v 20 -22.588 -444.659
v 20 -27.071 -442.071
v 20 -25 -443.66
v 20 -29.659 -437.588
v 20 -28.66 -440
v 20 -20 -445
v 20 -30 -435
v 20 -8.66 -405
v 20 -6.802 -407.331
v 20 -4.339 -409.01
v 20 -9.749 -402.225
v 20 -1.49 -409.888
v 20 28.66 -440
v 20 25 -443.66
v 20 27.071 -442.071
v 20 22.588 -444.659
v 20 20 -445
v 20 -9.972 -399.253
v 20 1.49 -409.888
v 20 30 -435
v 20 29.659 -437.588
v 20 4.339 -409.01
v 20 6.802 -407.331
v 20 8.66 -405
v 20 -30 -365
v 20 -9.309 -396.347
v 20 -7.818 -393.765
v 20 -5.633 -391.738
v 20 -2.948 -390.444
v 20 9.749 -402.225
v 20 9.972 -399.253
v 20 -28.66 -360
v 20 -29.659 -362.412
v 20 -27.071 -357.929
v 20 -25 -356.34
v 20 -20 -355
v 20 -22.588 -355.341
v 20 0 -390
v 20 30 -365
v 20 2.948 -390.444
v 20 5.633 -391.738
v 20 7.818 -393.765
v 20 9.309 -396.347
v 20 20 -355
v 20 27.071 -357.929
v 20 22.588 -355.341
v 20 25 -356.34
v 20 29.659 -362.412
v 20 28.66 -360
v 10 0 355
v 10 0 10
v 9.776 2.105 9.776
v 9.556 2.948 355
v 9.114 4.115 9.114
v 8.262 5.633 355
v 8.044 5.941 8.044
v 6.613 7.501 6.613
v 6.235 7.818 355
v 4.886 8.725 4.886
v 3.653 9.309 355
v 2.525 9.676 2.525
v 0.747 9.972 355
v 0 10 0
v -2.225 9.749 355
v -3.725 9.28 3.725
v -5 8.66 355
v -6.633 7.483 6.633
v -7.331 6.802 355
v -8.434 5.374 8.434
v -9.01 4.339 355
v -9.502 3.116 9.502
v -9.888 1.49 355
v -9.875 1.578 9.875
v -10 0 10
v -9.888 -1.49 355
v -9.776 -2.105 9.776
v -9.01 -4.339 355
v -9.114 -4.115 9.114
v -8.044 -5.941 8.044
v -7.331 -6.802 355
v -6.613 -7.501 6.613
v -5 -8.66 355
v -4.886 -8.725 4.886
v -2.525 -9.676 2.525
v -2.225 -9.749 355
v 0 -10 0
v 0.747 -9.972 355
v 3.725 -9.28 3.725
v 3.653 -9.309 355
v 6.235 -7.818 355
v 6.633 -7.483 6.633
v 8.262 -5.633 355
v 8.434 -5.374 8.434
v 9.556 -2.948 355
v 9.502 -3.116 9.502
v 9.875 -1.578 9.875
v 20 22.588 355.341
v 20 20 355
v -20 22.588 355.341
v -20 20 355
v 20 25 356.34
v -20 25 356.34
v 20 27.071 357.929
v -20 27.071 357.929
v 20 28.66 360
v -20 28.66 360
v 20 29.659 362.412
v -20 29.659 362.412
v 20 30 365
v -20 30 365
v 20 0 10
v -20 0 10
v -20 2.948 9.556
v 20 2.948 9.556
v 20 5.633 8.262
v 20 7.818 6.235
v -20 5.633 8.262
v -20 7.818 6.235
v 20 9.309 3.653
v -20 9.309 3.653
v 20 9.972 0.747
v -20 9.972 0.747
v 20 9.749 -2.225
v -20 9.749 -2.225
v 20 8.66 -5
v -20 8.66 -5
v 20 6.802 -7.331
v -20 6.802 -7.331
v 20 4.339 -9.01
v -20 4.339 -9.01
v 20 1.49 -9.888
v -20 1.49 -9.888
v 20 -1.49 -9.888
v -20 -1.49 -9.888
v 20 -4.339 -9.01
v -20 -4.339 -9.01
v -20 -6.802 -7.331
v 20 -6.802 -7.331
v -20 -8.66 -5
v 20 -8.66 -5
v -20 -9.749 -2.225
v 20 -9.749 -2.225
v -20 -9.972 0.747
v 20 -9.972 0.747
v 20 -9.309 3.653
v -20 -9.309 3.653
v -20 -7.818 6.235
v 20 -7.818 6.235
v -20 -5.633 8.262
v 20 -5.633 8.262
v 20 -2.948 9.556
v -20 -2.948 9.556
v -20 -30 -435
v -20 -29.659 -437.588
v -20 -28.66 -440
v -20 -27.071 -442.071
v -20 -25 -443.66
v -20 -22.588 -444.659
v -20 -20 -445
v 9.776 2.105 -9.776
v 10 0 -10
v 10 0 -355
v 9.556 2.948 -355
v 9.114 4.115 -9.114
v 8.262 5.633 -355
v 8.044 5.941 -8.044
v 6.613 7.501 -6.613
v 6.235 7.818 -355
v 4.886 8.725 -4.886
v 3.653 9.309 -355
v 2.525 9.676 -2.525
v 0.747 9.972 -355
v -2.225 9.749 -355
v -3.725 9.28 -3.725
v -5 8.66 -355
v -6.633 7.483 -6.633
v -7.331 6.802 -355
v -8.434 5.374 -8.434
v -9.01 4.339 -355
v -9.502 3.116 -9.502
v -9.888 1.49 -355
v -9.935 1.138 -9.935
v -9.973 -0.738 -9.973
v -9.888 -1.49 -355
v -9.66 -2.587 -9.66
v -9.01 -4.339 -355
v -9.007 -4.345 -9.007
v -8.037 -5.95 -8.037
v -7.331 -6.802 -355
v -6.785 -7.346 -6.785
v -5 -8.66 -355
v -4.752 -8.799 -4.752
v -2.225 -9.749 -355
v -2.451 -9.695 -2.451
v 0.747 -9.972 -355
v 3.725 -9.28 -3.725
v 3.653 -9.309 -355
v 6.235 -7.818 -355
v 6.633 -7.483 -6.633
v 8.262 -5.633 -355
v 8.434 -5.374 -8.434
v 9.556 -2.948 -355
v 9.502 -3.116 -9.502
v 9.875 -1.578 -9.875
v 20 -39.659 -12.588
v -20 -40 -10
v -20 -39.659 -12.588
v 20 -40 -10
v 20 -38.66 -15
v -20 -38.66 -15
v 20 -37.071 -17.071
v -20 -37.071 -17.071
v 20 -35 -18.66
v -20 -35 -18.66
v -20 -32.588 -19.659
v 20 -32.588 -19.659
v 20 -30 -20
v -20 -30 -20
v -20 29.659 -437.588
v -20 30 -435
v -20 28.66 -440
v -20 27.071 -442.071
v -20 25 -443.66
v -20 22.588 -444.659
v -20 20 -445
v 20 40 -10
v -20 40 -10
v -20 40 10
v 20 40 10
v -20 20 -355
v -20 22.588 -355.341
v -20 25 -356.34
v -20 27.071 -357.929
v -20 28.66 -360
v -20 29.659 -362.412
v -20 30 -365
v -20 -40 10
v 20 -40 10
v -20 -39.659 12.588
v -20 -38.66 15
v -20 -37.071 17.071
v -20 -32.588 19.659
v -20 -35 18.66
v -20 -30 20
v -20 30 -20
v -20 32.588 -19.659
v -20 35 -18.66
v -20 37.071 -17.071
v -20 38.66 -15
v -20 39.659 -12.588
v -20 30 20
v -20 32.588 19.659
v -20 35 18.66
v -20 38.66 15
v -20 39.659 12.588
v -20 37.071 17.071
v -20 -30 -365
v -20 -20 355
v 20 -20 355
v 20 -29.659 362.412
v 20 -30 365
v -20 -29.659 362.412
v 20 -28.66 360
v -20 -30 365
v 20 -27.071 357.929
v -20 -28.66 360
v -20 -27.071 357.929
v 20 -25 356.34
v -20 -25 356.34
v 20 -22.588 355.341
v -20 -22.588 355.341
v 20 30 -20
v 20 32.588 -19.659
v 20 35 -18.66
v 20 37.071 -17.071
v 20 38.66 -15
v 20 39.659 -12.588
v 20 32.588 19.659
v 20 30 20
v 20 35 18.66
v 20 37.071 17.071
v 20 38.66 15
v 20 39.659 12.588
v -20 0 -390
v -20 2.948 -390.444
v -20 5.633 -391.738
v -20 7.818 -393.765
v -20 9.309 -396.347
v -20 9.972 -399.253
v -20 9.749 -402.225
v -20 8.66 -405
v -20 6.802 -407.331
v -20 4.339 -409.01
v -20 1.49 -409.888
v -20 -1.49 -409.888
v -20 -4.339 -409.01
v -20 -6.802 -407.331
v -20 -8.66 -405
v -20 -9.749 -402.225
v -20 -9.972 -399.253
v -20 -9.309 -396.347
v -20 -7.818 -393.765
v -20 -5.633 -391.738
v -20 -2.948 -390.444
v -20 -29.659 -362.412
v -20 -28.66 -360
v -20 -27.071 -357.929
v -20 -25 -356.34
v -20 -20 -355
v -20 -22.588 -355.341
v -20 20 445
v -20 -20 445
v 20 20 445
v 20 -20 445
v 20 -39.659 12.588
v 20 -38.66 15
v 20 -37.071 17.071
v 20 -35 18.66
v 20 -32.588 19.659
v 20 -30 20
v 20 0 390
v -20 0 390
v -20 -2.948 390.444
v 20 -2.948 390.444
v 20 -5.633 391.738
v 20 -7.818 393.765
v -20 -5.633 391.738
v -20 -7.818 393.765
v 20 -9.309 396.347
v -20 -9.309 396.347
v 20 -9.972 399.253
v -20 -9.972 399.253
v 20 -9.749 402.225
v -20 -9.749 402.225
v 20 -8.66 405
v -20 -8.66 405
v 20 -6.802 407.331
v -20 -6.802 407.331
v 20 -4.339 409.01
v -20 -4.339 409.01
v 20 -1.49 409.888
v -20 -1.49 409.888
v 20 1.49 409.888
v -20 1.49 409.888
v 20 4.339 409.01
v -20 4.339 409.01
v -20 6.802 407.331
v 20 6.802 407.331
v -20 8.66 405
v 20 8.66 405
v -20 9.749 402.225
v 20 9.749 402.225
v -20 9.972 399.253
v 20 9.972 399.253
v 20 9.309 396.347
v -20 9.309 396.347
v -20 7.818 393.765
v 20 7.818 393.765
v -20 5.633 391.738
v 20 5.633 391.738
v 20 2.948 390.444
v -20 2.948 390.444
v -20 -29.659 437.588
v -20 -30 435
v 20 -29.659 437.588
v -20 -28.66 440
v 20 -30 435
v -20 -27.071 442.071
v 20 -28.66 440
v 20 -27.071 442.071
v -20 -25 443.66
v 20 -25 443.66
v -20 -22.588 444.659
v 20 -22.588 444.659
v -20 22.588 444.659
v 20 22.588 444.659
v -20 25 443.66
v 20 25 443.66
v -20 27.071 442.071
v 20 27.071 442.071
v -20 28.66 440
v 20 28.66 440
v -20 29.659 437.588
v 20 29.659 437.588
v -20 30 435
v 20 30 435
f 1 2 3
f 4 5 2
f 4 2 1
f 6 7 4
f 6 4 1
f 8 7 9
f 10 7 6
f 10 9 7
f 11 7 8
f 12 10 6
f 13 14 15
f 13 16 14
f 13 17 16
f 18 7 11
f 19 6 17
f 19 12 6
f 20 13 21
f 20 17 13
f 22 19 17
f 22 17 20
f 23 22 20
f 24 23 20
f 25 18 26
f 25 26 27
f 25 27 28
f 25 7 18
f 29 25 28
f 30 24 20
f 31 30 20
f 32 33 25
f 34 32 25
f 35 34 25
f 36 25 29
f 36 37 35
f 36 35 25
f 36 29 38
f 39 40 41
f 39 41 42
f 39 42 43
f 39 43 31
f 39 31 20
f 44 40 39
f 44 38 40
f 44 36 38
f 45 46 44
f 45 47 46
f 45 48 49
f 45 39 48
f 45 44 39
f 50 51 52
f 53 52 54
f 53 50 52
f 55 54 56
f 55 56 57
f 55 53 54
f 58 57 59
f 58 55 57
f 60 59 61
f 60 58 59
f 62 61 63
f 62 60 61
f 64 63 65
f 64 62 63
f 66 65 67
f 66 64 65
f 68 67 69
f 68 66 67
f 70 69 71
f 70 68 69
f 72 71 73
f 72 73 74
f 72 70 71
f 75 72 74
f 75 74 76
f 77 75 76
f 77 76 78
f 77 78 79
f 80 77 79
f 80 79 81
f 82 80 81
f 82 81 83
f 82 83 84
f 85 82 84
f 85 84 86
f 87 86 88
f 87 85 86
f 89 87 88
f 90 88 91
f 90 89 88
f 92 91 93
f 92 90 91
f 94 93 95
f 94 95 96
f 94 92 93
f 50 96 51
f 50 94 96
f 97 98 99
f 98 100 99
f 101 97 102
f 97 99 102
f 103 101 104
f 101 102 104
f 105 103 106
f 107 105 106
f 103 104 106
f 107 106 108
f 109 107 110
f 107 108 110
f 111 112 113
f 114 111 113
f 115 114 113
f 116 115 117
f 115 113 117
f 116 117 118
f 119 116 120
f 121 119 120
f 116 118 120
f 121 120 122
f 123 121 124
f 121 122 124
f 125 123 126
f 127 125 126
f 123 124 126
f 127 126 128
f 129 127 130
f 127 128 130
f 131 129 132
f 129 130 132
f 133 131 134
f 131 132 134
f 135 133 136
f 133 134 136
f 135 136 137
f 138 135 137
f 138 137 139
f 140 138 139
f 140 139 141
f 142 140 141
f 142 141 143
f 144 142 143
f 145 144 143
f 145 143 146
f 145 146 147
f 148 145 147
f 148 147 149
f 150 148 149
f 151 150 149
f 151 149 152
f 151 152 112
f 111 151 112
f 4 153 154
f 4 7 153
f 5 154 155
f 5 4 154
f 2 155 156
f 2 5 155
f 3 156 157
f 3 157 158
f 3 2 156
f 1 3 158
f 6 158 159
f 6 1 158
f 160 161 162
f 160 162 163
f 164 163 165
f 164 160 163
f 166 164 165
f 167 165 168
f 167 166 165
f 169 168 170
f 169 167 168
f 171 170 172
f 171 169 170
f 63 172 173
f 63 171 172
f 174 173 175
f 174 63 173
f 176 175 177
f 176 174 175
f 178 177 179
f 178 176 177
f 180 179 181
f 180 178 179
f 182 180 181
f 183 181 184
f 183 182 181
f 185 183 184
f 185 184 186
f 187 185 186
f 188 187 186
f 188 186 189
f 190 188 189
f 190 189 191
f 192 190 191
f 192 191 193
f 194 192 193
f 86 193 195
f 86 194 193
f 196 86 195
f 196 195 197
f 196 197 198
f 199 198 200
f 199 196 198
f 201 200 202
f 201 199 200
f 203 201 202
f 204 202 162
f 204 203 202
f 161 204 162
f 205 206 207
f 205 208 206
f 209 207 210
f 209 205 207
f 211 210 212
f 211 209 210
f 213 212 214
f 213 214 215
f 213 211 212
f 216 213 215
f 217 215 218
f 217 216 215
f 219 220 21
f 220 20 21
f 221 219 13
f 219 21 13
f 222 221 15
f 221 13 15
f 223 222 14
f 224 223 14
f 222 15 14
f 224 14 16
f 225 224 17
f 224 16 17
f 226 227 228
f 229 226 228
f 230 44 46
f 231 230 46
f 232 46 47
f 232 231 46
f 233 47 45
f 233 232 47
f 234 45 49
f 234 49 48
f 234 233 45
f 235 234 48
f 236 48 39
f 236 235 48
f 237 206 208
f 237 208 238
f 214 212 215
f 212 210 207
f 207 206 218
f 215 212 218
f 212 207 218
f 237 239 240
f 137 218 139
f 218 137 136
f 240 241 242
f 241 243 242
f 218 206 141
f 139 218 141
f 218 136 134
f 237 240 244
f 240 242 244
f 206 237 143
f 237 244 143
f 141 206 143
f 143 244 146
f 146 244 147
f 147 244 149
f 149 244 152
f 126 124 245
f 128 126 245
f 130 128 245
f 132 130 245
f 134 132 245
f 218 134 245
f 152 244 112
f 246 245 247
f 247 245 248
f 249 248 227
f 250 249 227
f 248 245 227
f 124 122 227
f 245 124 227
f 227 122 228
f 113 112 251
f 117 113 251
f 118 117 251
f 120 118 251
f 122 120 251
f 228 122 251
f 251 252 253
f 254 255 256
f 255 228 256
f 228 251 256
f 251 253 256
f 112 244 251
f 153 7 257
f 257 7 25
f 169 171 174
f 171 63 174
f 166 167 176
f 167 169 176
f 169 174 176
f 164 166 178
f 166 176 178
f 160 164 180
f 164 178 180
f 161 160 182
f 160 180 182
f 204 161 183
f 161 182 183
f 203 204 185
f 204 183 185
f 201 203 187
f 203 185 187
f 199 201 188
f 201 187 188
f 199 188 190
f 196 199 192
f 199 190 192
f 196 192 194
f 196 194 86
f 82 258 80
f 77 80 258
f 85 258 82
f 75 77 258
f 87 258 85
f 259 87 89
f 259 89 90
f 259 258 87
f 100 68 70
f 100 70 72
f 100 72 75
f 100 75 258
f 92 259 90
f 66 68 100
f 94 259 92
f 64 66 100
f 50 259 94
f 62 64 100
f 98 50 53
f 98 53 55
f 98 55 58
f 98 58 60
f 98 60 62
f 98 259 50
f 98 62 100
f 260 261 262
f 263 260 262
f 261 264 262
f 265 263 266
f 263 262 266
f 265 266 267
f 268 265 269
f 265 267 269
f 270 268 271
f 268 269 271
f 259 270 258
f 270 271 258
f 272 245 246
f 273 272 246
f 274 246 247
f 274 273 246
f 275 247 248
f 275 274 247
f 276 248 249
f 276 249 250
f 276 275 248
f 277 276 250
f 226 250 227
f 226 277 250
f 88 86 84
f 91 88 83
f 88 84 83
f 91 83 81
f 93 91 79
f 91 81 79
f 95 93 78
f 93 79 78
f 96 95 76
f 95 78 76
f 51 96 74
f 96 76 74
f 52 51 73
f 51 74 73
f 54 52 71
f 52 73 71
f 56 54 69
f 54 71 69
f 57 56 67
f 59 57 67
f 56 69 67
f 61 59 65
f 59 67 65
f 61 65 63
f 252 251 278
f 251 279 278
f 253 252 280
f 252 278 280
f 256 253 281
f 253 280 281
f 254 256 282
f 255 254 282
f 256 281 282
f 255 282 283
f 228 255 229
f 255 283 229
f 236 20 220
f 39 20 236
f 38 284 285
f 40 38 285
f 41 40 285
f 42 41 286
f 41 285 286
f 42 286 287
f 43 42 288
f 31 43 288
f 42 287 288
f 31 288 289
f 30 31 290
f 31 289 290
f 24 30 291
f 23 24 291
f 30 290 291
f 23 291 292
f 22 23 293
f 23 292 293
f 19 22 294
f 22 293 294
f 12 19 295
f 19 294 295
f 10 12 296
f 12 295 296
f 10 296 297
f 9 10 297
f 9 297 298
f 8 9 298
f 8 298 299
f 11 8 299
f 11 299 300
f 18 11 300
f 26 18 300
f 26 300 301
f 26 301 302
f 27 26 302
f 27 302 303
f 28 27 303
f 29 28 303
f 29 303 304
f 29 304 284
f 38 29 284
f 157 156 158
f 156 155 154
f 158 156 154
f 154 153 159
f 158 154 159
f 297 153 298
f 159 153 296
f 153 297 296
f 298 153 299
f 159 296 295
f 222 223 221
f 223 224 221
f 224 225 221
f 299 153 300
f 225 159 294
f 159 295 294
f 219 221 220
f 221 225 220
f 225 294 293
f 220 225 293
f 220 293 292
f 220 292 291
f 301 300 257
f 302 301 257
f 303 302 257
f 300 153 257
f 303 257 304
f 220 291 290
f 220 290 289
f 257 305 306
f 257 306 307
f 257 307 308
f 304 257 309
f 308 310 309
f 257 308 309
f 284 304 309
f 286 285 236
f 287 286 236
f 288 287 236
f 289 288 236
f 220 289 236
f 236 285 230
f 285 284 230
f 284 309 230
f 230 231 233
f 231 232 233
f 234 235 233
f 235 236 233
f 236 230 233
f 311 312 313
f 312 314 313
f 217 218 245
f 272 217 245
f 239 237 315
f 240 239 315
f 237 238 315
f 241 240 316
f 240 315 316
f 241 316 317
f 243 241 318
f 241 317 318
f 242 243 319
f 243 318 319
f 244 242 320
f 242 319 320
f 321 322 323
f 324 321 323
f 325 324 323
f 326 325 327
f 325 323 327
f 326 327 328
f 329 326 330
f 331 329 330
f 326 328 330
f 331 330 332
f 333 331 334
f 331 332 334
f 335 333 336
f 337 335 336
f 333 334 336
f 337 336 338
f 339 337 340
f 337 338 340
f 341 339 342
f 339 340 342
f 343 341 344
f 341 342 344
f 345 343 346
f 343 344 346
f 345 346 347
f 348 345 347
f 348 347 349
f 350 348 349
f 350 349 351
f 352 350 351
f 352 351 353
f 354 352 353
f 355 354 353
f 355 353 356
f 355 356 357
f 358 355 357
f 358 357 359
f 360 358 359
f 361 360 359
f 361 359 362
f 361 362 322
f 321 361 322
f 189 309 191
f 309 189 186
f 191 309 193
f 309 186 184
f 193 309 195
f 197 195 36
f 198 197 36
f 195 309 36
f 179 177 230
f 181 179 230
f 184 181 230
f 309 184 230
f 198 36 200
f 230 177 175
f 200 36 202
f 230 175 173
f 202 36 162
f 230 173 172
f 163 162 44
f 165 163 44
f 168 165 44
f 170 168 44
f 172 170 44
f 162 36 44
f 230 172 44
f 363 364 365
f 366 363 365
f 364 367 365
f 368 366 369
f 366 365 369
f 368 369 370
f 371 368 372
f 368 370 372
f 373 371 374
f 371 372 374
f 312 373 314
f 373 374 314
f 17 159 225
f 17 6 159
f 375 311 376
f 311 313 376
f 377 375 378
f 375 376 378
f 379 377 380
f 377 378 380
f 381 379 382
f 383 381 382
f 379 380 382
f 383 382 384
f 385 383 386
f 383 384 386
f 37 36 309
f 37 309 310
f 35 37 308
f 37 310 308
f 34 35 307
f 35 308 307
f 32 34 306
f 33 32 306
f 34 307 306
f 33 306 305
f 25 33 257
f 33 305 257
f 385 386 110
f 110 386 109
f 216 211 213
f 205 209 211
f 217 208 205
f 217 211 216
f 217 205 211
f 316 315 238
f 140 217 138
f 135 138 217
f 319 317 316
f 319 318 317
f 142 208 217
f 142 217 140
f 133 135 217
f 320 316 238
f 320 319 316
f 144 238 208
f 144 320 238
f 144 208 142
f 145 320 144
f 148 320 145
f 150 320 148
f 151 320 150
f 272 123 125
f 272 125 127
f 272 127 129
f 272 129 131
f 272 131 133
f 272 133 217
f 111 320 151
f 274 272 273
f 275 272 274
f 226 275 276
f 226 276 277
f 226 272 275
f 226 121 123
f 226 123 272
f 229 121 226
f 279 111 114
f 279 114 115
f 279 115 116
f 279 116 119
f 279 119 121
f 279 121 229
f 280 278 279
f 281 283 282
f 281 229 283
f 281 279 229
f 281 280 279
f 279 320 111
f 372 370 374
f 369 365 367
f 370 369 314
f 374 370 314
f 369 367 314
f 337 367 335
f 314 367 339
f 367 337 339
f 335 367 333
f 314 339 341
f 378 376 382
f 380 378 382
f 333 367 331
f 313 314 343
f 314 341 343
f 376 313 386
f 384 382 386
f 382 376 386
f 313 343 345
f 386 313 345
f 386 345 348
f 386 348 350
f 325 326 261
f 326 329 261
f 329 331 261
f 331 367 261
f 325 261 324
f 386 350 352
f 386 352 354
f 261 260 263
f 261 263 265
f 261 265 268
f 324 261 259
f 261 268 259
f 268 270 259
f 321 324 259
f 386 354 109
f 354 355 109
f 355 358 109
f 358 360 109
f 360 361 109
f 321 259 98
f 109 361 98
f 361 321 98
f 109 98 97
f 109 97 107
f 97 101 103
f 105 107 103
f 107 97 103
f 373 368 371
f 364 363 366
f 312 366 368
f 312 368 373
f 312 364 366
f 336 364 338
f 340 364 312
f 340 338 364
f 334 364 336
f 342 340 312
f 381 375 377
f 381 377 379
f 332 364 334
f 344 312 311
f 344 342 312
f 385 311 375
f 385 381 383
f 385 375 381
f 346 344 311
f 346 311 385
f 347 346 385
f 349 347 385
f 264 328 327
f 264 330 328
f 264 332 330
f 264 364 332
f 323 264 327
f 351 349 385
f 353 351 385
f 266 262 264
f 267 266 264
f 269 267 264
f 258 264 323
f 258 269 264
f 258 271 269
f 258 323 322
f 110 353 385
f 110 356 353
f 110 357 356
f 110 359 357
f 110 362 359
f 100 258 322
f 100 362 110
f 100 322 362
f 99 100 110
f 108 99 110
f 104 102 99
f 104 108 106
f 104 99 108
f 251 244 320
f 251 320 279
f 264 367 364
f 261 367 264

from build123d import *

# Parameters (mm, degrees)
SKETCH1_R                = 10
BOSS_EXTRUDE1_DEPTH      = 400
BOSS_EXTRUDE2_DEPTH      = 20
BOSS_EXTRUDE2_DEPTH_BACK = 20
SKETCH2_W                = 80
SKETCH2_H                = 40
SKETCH3_W                = 60
SKETCH3_H                = 90
BOSS_EXTRUDE3_DEPTH      = 20
SKETCH4_R                = 10
CUT_EXTRUDE1_DEPTH       = 54
SKETCH5_R                = 10
CUT_EXTRUDE4_DEPTH       = 54
FILLET1_R                = 10
FILLET2_R                = 10
FILLET3_R                = 10


with BuildPart() as part:
    # Sketch1 → Boss-Extrude1 (new body)
    with BuildSketch(Plane(origin=(0, 0, 0), x_dir=(0, 1, 0), z_dir=(0, 0, 1))):
        Circle(SKETCH1_R)
    boss_extrude1 = extrude(amount=BOSS_EXTRUDE1_DEPTH)

    # Mirror1: Boss-Extrude1 across plane
    add(boss_extrude1.mirror(Plane.XY))

    # Sketch3 → Boss-Extrude3 (add, symmetric)
    with BuildSketch(Plane.YZ):
        with Locations((0, -400)):
            Rectangle(SKETCH3_W, SKETCH3_H)
    boss_extrude3 = extrude(amount=BOSS_EXTRUDE3_DEPTH, both=True)

    # Mirror2: Boss-Extrude3 across plane
    add(boss_extrude3.mirror(Plane.XY))

    # Sketch4 → Cut-Extrude1 (cut)
    with BuildSketch(Plane(origin=(-20, 0, 0), x_dir=(0, -1, 0), z_dir=(-1, 0, 0))):
        with Locations((0, -400)):
            Circle(SKETCH4_R)
        with Locations((0, 400)):
            Circle(SKETCH4_R)
    extrude(amount=-CUT_EXTRUDE1_DEPTH, mode=Mode.SUBTRACT)


with BuildPart() as body_2:
    # Sketch2 → Boss-Extrude2 (new, two sides: drawn at the far end of the back side and taken through both)
    with BuildSketch(Plane.YZ.offset(-BOSS_EXTRUDE2_DEPTH_BACK)):
        Rectangle(SKETCH2_W, SKETCH2_H)
    extrude(amount=BOSS_EXTRUDE2_DEPTH + BOSS_EXTRUDE2_DEPTH_BACK)


with BuildPart() as cut_extrude4_tool:
    # Sketch5 → Cut-Extrude4 (new body)
    with BuildSketch(Plane(origin=(-20, 0, 0), x_dir=(0, -1, 0), z_dir=(-1, 0, 0))):
        Circle(SKETCH5_R)
    extrude(amount=-CUT_EXTRUDE4_DEPTH)


with BuildPart() as part_1:
    add(part.part)

    # Cut-Extrude4: cut by cut_extrude4_tool
    add(cut_extrude4_tool.part, mode=Mode.SUBTRACT)

    # Fillet1
    fillet1_edges = [part_1.edges().sort_by_distance(p)[0] for p in [
        (0, -30, -445),
        (0, 30, -445),
        (0, 30, -355),
        (0, -30, -355),
    ]]
    fillet(fillet1_edges, radius=FILLET1_R)

    # Fillet3
    fillet3_edges = [part_1.edges().sort_by_distance(p)[0] for p in [
        (0, -30, 355),
        (0, 30, 355),
        (0, -30, 445),
        (0, 30, 445),
    ]]
    fillet(fillet3_edges, radius=FILLET3_R)


with BuildPart() as body_2_1:
    add(body_2.part)

    # Cut-Extrude4: cut by cut_extrude4_tool
    add(cut_extrude4_tool.part, mode=Mode.SUBTRACT)

    # Fillet2
    fillet2_edges = [body_2_1.edges().sort_by_distance(p)[0] for p in [
        (0, -40, -20),
        (0, 40, -20),
        (0, 40, 20),
        (0, -40, 20),
    ]]
    fillet(fillet2_edges, radius=FILLET2_R)


solid = Compound([part_1.part, body_2_1.part])
